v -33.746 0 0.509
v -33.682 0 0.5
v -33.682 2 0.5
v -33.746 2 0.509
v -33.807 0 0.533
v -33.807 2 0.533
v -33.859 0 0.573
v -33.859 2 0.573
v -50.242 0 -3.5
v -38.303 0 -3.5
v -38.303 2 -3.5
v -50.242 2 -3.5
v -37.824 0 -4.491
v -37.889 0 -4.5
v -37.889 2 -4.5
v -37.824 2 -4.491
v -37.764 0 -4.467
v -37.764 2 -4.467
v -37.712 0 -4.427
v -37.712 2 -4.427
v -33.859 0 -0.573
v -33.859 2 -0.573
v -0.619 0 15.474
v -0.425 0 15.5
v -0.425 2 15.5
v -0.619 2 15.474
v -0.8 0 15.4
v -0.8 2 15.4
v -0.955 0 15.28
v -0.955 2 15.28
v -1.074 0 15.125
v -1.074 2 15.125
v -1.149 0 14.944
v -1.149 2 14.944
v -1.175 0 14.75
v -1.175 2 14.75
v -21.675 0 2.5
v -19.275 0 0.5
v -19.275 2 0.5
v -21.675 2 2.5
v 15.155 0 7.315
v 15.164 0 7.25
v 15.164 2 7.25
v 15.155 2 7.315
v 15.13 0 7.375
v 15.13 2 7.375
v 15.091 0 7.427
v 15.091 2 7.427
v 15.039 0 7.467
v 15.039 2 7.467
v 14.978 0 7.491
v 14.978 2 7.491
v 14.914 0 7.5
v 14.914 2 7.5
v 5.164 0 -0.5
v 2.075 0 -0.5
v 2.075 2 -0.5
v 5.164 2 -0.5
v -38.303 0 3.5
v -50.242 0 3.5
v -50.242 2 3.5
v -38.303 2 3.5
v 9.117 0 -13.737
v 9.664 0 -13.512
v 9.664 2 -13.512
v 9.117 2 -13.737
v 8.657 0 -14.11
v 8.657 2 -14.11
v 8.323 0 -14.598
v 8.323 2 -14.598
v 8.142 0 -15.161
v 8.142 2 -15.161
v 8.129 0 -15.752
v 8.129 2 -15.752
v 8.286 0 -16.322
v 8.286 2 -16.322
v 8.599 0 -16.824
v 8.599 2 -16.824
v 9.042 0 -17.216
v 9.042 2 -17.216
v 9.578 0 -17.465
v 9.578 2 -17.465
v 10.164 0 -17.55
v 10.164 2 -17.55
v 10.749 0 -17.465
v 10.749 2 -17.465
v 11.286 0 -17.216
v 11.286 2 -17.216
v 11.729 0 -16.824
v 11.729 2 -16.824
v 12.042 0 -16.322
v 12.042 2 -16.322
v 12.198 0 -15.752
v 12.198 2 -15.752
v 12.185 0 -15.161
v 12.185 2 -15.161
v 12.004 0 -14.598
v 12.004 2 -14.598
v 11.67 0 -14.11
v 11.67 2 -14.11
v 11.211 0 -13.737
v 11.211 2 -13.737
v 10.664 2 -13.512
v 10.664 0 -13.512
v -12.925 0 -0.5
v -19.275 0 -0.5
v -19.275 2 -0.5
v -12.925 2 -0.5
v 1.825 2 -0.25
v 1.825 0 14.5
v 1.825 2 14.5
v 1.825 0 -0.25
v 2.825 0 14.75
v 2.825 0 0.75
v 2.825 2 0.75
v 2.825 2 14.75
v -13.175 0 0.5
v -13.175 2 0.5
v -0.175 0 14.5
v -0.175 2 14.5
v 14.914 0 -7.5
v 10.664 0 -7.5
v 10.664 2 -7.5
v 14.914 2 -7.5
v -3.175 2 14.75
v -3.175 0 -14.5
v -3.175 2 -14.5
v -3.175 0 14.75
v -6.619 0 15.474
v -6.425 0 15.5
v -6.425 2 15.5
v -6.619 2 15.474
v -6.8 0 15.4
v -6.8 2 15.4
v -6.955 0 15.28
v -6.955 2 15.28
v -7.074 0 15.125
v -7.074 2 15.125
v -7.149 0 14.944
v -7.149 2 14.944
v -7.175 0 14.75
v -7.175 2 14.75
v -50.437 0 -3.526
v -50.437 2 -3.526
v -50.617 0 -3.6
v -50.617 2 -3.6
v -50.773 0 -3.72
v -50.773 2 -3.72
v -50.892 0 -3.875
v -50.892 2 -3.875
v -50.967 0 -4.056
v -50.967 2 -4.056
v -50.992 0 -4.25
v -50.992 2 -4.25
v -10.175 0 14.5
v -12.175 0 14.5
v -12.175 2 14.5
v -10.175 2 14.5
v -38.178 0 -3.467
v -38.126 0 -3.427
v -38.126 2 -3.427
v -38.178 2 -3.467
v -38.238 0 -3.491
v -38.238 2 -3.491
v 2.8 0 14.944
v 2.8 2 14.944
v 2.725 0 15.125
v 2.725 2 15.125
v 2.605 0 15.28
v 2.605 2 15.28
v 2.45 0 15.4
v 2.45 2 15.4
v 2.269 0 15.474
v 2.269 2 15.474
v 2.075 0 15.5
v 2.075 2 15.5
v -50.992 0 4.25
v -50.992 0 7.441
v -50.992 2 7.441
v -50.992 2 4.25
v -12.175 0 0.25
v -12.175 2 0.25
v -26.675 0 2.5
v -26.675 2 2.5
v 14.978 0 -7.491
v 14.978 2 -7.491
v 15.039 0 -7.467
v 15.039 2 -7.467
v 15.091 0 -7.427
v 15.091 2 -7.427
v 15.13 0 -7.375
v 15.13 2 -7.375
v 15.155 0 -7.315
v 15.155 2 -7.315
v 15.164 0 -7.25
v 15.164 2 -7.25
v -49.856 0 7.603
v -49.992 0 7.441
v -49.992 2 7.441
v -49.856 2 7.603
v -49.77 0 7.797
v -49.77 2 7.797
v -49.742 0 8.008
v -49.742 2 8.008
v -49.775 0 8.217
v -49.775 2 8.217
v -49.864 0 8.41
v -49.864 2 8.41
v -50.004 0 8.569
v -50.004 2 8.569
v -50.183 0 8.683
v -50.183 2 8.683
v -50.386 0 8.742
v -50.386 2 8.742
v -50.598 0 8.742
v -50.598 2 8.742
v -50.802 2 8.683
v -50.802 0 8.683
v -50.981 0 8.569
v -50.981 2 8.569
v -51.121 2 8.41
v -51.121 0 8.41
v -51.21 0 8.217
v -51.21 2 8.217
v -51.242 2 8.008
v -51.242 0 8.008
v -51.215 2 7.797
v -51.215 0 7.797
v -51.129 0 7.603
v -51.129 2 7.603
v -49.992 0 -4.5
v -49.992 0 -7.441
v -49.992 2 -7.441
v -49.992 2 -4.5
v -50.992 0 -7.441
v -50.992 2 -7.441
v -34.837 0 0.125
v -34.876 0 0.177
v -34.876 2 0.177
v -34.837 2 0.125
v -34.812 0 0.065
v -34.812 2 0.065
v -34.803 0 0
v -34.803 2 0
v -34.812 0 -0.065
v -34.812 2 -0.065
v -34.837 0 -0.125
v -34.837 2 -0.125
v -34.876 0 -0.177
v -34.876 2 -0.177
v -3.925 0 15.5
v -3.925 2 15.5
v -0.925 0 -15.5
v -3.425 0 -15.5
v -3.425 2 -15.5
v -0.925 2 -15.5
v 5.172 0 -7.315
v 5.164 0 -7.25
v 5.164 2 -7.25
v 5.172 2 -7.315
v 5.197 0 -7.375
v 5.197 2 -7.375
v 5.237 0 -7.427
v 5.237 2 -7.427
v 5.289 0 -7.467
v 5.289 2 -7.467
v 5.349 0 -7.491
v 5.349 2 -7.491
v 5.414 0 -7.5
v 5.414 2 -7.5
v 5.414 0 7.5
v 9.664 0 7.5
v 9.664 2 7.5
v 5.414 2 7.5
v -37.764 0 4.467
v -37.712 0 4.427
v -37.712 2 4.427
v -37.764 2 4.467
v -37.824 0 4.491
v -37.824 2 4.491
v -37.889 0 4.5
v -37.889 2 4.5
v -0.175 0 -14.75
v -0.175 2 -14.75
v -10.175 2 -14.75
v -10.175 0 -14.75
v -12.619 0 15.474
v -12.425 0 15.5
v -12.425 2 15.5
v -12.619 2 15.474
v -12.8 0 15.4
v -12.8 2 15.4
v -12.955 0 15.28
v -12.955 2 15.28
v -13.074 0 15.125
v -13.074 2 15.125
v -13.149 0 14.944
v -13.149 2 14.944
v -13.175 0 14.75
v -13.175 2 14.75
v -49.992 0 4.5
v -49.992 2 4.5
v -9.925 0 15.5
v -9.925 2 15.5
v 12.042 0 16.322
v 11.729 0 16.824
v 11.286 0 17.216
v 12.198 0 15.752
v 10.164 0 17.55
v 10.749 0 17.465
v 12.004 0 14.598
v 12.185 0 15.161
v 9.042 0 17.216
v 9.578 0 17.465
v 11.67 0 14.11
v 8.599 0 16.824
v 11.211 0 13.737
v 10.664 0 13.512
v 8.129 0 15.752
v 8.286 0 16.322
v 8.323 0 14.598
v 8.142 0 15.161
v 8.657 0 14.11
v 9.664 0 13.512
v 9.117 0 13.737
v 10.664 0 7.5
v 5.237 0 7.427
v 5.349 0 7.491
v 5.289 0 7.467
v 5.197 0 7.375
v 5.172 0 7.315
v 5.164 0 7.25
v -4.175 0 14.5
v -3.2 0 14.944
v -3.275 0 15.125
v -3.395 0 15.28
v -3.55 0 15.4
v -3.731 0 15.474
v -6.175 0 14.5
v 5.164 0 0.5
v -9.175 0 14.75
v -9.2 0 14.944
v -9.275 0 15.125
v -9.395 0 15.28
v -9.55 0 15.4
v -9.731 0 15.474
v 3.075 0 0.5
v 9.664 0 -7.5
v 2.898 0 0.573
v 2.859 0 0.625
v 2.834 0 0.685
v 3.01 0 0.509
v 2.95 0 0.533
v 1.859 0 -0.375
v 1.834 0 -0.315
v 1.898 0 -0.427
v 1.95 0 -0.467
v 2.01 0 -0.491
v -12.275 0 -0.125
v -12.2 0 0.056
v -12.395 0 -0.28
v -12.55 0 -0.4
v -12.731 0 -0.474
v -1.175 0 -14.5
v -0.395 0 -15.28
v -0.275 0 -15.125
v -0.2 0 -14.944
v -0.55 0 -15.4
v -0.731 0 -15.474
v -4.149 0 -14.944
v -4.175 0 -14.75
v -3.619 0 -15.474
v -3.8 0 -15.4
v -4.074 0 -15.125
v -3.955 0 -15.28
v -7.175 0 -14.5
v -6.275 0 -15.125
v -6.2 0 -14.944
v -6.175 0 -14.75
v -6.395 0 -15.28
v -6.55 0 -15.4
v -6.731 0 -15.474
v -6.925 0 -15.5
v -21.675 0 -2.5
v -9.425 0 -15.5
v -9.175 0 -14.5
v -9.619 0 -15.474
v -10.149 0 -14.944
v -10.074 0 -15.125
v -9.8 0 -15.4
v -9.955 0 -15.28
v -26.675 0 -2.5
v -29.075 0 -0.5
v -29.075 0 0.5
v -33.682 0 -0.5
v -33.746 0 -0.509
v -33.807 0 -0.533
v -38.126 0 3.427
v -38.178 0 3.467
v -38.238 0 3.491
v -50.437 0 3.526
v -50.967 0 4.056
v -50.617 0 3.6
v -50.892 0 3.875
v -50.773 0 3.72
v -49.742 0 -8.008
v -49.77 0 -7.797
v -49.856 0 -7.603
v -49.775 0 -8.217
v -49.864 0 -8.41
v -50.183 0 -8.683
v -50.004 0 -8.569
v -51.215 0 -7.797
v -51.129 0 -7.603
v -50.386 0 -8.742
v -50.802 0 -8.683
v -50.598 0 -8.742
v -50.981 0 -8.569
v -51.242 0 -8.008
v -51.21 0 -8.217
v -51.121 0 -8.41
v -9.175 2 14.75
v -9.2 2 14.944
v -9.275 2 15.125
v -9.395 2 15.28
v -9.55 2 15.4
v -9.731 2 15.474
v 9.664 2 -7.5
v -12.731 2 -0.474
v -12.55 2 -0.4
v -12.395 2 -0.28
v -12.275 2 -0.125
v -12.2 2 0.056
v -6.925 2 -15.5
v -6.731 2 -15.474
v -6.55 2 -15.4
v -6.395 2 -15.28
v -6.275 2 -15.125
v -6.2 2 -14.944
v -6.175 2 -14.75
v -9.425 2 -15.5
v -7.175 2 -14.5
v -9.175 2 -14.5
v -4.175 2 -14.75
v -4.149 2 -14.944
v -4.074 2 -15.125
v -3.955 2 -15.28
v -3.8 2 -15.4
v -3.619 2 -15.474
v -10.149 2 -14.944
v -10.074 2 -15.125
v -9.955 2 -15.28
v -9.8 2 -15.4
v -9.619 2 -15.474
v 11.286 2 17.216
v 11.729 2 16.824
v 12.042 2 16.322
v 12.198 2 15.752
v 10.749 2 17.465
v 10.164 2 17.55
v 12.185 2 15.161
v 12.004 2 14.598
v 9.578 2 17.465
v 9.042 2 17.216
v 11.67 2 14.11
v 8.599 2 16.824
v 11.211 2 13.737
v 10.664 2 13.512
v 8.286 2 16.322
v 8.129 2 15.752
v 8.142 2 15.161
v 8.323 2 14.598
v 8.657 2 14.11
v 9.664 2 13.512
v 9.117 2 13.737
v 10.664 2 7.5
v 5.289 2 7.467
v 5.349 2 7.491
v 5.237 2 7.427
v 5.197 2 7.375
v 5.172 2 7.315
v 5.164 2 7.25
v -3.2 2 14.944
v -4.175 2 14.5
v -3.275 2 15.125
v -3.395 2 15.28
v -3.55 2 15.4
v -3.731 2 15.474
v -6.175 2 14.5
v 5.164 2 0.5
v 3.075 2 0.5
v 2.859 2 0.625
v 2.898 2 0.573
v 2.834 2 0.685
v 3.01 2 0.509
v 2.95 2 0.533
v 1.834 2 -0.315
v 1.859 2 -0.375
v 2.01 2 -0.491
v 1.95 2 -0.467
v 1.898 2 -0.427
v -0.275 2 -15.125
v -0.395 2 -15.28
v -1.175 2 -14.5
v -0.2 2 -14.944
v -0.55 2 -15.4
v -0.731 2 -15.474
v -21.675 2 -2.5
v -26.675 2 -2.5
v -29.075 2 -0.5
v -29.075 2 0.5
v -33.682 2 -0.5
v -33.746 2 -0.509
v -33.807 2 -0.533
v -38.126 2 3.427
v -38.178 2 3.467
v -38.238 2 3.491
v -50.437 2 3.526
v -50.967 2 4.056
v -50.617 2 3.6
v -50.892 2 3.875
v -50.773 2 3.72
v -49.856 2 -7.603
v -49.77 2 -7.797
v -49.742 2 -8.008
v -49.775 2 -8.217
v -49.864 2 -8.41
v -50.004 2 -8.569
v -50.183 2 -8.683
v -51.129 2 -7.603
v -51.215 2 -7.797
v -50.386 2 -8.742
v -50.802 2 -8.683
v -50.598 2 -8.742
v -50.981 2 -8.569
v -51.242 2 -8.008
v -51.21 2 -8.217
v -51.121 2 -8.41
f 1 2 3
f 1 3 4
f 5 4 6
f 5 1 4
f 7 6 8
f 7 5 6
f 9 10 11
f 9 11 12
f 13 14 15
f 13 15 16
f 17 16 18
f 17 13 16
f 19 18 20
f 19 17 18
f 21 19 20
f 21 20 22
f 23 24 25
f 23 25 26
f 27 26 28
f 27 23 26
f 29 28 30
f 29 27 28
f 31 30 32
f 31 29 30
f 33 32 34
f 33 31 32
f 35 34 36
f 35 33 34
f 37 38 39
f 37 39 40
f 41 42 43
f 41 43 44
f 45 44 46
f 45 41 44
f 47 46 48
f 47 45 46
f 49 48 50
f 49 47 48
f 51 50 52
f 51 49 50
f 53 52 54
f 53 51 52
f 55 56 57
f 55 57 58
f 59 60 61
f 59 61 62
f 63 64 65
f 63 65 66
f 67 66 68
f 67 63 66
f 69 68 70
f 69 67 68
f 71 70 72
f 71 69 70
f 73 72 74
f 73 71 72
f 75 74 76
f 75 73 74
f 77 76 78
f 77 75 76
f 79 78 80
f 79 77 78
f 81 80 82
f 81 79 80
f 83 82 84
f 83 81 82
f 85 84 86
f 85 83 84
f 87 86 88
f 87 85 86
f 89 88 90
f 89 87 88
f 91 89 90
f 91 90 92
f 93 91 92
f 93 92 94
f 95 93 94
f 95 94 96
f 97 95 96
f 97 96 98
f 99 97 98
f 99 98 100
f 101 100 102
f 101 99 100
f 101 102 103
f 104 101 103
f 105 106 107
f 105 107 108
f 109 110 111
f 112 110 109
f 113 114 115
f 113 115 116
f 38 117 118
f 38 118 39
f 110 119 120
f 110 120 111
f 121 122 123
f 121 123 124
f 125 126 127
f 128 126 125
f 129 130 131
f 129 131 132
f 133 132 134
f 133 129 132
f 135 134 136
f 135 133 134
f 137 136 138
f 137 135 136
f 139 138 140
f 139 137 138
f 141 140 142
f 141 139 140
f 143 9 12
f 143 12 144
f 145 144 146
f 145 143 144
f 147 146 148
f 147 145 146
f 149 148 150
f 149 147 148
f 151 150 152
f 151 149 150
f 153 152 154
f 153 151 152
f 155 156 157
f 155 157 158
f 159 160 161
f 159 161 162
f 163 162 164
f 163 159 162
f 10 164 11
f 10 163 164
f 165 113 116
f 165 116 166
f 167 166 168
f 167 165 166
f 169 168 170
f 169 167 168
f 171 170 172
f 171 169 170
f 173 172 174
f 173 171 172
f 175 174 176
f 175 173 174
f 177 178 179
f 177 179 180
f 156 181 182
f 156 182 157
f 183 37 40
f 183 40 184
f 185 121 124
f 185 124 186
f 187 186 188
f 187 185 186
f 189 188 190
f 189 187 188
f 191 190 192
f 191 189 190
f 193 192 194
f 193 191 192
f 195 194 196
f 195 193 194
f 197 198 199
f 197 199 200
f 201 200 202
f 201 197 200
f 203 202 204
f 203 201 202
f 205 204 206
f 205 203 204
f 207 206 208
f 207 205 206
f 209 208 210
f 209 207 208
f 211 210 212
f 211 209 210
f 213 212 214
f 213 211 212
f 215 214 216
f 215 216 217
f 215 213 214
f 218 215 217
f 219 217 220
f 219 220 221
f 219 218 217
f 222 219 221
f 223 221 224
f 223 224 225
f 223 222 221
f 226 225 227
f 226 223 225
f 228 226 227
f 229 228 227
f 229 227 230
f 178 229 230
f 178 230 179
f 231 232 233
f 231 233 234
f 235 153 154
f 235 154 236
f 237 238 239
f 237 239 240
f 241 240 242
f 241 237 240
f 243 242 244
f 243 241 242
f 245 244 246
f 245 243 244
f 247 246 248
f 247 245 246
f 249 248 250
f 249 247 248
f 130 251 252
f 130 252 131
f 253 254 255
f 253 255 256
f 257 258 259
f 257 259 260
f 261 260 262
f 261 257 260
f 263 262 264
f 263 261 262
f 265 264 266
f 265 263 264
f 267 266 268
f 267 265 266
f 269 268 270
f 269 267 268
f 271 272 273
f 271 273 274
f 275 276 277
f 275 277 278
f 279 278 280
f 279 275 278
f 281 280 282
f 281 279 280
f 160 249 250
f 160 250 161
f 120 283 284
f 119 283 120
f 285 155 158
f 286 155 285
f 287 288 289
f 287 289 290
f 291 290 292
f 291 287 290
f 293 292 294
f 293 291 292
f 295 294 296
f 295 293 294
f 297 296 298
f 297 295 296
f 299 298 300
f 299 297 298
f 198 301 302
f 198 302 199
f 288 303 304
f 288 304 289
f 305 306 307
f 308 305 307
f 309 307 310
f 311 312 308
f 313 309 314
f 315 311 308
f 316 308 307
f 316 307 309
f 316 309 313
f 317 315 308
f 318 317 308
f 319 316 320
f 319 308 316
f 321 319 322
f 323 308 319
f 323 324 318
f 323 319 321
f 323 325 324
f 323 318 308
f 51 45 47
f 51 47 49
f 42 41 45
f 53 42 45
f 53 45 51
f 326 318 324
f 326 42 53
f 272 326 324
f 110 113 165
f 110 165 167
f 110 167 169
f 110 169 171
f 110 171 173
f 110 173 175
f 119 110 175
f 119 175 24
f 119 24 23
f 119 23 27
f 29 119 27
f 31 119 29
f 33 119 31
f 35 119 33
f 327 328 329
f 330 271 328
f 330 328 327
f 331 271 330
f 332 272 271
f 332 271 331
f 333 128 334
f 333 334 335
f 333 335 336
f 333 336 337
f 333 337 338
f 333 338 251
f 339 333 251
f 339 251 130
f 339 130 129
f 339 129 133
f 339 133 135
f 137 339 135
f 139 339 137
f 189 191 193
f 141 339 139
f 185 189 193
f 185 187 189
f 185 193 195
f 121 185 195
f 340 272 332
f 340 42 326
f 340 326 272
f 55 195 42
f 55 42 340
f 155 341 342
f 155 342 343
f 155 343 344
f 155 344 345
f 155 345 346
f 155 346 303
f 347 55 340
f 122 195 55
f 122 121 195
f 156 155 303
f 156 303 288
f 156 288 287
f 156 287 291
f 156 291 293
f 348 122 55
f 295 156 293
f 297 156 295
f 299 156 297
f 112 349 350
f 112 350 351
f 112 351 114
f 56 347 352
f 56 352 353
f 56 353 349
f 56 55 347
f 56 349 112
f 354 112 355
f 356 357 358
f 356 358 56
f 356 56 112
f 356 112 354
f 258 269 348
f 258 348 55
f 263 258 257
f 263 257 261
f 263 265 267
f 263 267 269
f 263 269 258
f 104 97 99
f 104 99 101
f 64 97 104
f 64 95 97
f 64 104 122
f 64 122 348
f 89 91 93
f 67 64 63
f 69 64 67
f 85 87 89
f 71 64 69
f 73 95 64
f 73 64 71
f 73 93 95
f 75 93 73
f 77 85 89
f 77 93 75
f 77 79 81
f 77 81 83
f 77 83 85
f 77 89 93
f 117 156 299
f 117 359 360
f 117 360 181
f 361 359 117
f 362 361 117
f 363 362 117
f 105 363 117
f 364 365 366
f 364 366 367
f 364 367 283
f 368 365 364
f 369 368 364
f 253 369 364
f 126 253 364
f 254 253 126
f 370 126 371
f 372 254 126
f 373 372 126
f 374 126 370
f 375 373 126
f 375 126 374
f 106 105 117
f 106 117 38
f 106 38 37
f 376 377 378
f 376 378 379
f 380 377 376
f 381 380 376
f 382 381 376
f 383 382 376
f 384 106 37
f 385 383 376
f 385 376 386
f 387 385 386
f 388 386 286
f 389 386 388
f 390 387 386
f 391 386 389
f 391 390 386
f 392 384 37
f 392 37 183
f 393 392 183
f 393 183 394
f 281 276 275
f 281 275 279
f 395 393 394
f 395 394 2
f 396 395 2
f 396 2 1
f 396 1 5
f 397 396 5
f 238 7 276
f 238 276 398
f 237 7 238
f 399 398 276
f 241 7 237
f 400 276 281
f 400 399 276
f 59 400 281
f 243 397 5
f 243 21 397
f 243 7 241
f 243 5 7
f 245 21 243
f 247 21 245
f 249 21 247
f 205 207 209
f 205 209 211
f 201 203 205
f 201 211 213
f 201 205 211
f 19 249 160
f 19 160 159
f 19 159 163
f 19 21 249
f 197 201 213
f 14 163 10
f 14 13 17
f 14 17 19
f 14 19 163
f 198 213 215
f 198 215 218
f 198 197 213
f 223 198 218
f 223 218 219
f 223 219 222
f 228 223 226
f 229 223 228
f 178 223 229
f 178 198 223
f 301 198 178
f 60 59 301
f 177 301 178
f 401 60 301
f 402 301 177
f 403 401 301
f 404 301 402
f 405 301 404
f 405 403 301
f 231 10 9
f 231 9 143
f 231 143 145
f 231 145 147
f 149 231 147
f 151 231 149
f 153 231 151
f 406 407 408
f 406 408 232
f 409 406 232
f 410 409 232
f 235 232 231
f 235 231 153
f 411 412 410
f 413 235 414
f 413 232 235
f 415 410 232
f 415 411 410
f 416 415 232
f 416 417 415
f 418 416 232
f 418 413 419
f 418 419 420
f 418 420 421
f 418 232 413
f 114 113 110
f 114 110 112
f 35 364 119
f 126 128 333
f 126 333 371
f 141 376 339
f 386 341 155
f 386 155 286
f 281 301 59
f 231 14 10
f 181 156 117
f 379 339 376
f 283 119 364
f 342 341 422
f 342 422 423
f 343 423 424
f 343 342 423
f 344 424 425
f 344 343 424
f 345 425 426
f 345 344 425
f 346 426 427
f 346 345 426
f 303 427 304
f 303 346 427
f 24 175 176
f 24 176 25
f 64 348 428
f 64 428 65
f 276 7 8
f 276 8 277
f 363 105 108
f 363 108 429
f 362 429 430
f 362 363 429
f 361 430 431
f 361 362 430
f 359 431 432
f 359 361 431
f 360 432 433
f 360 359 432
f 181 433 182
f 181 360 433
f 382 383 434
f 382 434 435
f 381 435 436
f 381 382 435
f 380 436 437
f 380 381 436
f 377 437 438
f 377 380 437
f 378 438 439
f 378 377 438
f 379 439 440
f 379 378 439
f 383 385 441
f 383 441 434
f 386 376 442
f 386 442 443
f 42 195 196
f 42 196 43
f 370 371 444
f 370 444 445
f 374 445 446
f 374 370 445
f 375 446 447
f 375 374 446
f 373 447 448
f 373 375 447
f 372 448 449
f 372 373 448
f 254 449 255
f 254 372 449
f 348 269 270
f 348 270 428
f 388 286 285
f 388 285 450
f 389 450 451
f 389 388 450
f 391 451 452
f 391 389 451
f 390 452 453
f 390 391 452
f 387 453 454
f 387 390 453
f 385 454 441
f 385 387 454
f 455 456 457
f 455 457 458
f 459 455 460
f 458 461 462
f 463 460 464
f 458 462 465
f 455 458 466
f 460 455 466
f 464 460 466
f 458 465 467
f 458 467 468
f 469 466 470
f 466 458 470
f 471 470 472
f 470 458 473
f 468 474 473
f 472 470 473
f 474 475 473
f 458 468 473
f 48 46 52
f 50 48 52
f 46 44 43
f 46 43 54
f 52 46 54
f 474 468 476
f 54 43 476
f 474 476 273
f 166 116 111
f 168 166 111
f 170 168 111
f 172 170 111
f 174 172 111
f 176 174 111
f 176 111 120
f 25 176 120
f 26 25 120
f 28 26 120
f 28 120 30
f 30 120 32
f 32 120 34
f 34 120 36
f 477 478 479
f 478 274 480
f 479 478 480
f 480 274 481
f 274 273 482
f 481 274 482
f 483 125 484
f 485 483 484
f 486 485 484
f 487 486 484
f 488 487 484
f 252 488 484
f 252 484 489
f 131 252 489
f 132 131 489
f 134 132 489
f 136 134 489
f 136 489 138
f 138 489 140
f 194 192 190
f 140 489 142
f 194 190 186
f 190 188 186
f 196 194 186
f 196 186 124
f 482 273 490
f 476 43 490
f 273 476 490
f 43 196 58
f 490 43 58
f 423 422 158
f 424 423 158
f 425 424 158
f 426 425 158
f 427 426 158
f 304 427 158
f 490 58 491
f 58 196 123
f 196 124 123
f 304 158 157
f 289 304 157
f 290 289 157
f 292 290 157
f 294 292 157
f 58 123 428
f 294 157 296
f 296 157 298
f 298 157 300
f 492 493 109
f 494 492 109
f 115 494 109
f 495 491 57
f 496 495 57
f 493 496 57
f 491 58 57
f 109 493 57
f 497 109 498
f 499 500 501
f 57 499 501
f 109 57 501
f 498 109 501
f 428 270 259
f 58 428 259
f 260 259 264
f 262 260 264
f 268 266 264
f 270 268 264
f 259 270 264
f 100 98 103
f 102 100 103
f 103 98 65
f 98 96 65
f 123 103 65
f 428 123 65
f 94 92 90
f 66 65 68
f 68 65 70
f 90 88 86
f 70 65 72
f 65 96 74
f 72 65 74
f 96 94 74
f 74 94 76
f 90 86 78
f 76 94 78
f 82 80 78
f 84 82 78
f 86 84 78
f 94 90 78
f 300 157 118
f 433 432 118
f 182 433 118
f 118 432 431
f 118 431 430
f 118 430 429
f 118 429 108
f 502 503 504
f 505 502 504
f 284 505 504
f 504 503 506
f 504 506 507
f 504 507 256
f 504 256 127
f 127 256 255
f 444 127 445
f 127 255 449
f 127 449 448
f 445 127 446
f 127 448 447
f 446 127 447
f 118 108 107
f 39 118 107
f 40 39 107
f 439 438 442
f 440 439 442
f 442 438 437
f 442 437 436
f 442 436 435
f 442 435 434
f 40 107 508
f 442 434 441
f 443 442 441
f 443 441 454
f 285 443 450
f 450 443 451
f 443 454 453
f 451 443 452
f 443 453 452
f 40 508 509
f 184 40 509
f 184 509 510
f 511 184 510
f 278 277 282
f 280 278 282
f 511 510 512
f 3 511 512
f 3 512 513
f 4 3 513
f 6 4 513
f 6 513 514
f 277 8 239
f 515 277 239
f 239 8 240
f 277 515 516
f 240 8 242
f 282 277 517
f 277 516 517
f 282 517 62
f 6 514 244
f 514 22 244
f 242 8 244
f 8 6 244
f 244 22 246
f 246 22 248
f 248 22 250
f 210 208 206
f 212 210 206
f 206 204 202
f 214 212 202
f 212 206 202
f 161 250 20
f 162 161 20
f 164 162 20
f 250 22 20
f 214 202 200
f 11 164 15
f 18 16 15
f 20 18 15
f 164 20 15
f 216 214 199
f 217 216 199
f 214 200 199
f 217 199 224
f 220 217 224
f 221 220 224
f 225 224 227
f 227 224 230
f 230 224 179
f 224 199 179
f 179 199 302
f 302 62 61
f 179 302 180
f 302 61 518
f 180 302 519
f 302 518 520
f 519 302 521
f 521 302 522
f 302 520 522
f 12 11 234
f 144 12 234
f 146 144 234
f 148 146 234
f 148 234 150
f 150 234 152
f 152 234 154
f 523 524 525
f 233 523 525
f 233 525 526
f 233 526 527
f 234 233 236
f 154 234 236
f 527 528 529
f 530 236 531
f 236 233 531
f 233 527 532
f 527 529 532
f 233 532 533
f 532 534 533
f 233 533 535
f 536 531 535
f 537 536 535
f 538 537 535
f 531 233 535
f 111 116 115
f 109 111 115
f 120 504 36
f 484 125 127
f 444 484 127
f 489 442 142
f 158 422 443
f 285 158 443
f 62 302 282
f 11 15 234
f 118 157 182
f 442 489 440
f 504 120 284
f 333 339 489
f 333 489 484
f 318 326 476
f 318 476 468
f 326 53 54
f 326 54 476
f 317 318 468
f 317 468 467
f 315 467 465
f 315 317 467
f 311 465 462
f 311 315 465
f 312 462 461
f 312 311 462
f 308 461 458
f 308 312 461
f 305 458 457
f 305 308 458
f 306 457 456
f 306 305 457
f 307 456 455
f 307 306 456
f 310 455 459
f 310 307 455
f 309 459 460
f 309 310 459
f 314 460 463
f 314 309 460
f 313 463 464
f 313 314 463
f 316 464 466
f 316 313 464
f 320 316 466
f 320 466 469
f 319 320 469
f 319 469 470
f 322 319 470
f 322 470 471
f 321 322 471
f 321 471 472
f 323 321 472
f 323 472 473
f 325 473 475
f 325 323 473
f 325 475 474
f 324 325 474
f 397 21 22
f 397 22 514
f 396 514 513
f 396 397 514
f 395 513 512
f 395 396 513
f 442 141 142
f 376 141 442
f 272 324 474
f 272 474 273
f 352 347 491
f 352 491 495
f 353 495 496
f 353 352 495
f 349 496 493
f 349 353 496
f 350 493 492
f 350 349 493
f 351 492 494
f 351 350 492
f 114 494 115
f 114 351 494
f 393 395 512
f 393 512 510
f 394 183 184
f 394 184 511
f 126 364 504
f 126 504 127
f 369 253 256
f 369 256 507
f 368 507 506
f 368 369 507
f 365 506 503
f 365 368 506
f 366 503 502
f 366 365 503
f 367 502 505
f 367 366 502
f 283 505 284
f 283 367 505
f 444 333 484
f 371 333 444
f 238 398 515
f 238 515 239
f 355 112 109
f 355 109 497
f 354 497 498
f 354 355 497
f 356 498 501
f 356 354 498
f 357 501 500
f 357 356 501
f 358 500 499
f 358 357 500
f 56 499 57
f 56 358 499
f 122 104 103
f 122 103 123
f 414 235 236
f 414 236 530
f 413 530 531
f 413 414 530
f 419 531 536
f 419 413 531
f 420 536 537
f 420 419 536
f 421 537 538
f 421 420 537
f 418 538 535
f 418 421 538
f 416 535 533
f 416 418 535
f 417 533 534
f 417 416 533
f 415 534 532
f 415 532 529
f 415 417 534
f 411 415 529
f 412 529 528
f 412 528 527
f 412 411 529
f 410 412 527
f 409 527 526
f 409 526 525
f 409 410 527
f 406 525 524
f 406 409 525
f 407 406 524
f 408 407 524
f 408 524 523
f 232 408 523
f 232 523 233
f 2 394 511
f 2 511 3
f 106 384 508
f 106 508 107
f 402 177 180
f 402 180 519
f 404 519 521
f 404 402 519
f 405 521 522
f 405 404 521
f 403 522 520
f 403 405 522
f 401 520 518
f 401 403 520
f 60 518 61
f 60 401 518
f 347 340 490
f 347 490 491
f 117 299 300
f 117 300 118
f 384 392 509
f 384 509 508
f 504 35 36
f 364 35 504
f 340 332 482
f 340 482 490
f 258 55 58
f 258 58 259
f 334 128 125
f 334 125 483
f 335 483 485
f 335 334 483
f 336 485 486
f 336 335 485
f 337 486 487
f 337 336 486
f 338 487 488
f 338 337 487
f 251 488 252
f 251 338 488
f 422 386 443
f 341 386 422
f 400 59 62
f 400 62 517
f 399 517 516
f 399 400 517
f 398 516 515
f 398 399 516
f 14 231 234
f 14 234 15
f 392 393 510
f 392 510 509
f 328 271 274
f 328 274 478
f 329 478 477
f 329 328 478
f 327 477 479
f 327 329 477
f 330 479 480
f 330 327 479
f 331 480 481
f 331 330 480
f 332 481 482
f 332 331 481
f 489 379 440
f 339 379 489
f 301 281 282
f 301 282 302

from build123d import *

# Parameters (mm, degrees)
BOSS_EXTRUDE1_DEPTH = 2


with BuildPart() as part:
    # Sketch2 → Boss-Extrude1 (new body)
    with BuildSketch(Plane(origin=(0, 0, 0), x_dir=(1, 0, 0), z_dir=(0, 1, 0))):
        with BuildLine():
            Line((15.163755459, 7.25), (15.163755459, -7.25))
            ThreePointArc((15.163755459, -7.25), (15.090532154, -7.426776695), (14.913755459, -7.5))
            Line((14.913755459, -7.5), (10.663755459, -7.5))
            Line((10.663755459, -7.5), (10.663755459, -13.511910465))
            ThreePointArc((10.663755459, -13.511910465), (10.163755459, -17.55), (9.663755459, -13.511910465))
            Line((9.663755459, -13.511910465), (9.663755459, -7.5))
            Line((9.663755459, -7.5), (5.413755459, -7.5))
            ThreePointArc((5.413755459, -7.5), (5.236978763, -7.426776695), (5.163755459, -7.25))
            Line((5.163755459, -7.25), (5.163755459, -0.5))
            Line((5.163755459, -0.5), (3.075114856, -0.5))
            ThreePointArc((3.075114856, -0.5), (2.898338161, -0.573223305), (2.825114856, -0.75))
            Line((2.825114856, -0.75), (2.825114856, -14.75))
            ThreePointArc((2.825114856, -14.75), (2.605444942, -15.280330086), (2.075114856, -15.5))
            Line((2.075114856, -15.5), (-0.424885144, -15.5))
            ThreePointArc((-0.424885144, -15.5), (-0.95521523, -15.280330086), (-1.174885144, -14.75))
            Line((-1.174885144, -14.75), (-1.174885144, 14.5))
            Line((-1.174885144, 14.5), (-3.174885144, 14.5))
            Line((-3.174885144, 14.5), (-3.174885144, -14.75))
            ThreePointArc((-3.174885144, -14.75), (-3.394555058, -15.280330086), (-3.924885144, -15.5))
            Line((-3.924885144, -15.5), (-6.424885144, -15.5))
            ThreePointArc((-6.424885144, -15.5), (-6.95521523, -15.280330086), (-7.174885144, -14.75))
            Line((-7.174885144, -14.75), (-7.174885144, 14.5))
            Line((-7.174885144, 14.5), (-9.174885144, 14.5))
            Line((-9.174885144, 14.5), (-9.174885144, -14.75))
            ThreePointArc((-9.174885144, -14.75), (-9.394555058, -15.280330086), (-9.924885144, -15.5))
            Line((-9.924885144, -15.5), (-12.424885144, -15.5))
            ThreePointArc((-12.424885144, -15.5), (-12.95521523, -15.280330086), (-13.174885144, -14.75))
            Line((-13.174885144, -14.75), (-13.174885144, -0.5))
            Line((-13.174885144, -0.5), (-19.274885144, -0.5))
            Line((-19.274885144, -0.5), (-21.674885144, -2.5))
            Line((-21.674885144, -2.5), (-26.674885144, -2.5))
            Line((-26.674885144, -2.5), (-29.074885144, -0.5))
            Line((-29.074885144, -0.5), (-33.68175141, -0.5))
            ThreePointArc((-33.68175141, -0.5), (-33.777422268, -0.519030117), (-33.858528105, -0.573223305))
            Line((-33.858528105, -0.573223305), (-37.712081496, -4.426776695))
            ThreePointArc((-37.712081496, -4.426776695), (-37.793187333, -4.480969883), (-37.888858191, -4.5))
            Line((-37.888858191, -4.5), (-46.992411582, -4.5))
            Line((-46.992411582, -4.5), (-49.992411582, -4.5))
            Line((-49.992411582, -4.5), (-49.992411582, -7.440983006))
            ThreePointArc((-49.992411582, -7.440983006), (-50.492411582, -8.75), (-50.992411582, -7.440983006))
            Line((-50.992411582, -7.440983006), (-50.992411582, -4.25))
            ThreePointArc((-50.992411582, -4.25), (-50.772741668, -3.719669914), (-50.242411582, -3.5))
            Line((-50.242411582, -3.5), (-38.303071753, -3.5))
            ThreePointArc((-38.303071753, -3.5), (-38.207400895, -3.480969883), (-38.126295058, -3.426776695))
            Line((-38.126295058, -3.426776695), (-34.876295058, -0.176776695))
            ThreePointArc((-34.876295058, -0.176776695), (-34.803071753, 0), (-34.876295058, 0.176776695))
            Line((-34.876295058, 0.176776695), (-38.126295058, 3.426776695))
            ThreePointArc((-38.126295058, 3.426776695), (-38.207400895, 3.480969883), (-38.303071753, 3.5))
            Line((-38.303071753, 3.5), (-46.242411582, 3.5))
            Line((-46.242411582, 3.5), (-50.242411582, 3.5))
            ThreePointArc((-50.242411582, 3.5), (-50.772741668, 3.719669914), (-50.992411582, 4.25))
            Line((-50.992411582, 4.25), (-50.992411582, 7.440983006))
            ThreePointArc((-50.992411582, 7.440983006), (-50.492411582, 8.75), (-49.992411582, 7.440983006))
            Line((-49.992411582, 7.440983006), (-49.992411582, 4.5))
            Line((-49.992411582, 4.5), (-46.992411582, 4.5))
            Line((-46.992411582, 4.5), (-37.888858191, 4.5))
            ThreePointArc((-37.888858191, 4.5), (-37.793187333, 4.480969883), (-37.712081496, 4.426776695))
            Line((-37.712081496, 4.426776695), (-33.858528105, 0.573223305))
            ThreePointArc((-33.858528105, 0.573223305), (-33.777422268, 0.519030117), (-33.68175141, 0.5))
            Line((-33.68175141, 0.5), (-29.074885144, 0.5))
            Line((-29.074885144, 0.5), (-26.674885144, 2.5))
            Line((-26.674885144, 2.5), (-21.674885144, 2.5))
            Line((-21.674885144, 2.5), (-19.274885144, 0.5))
            Line((-19.274885144, 0.5), (-12.924885144, 0.5))
            ThreePointArc((-12.924885144, 0.5), (-12.394555058, 0.280330086), (-12.174885144, -0.25))
            Line((-12.174885144, -0.25), (-12.174885144, -14.5))
            Line((-12.174885144, -14.5), (-10.174885144, -14.5))
            Line((-10.174885144, -14.5), (-10.174885144, 14.75))
            ThreePointArc((-10.174885144, 14.75), (-9.95521523, 15.280330086), (-9.424885144, 15.5))
            Line((-9.424885144, 15.5), (-6.924885144, 15.5))
            ThreePointArc((-6.924885144, 15.5), (-6.394555058, 15.280330086), (-6.174885144, 14.75))
            Line((-6.174885144, 14.75), (-6.174885144, -14.5))
            Line((-6.174885144, -14.5), (-4.174885144, -14.5))
            Line((-4.174885144, -14.5), (-4.174885144, 14.75))
            ThreePointArc((-4.174885144, 14.75), (-3.95521523, 15.280330086), (-3.424885144, 15.5))
            Line((-3.424885144, 15.5), (-0.924885144, 15.5))
            ThreePointArc((-0.924885144, 15.5), (-0.394555058, 15.280330086), (-0.174885144, 14.75))
            Line((-0.174885144, 14.75), (-0.174885144, -14.5))
            Line((-0.174885144, -14.5), (1.825114856, -14.5))
            Line((1.825114856, -14.5), (1.825114856, 0.25))
            ThreePointArc((1.825114856, 0.25), (1.898338161, 0.426776695), (2.075114856, 0.5))
            Line((2.075114856, 0.5), (5.163755459, 0.5))
            Line((5.163755459, 0.5), (5.163755459, 7.25))
            ThreePointArc((5.163755459, 7.25), (5.236978763, 7.426776695), (5.413755459, 7.5))
            Line((5.413755459, 7.5), (9.663755459, 7.5))
            Line((9.663755459, 7.5), (9.663755459, 13.511910465))
            ThreePointArc((9.663755459, 13.511910465), (10.163755459, 17.55), (10.663755459, 13.511910465))
            Line((10.663755459, 13.511910465), (10.663755459, 7.5))
            Line((10.663755459, 7.5), (14.913755459, 7.5))
            ThreePointArc((14.913755459, 7.5), (15.090532154, 7.426776695), (15.163755459, 7.25))
        make_face()
    extrude(amount=BOSS_EXTRUDE1_DEPTH)


solid = part.part
